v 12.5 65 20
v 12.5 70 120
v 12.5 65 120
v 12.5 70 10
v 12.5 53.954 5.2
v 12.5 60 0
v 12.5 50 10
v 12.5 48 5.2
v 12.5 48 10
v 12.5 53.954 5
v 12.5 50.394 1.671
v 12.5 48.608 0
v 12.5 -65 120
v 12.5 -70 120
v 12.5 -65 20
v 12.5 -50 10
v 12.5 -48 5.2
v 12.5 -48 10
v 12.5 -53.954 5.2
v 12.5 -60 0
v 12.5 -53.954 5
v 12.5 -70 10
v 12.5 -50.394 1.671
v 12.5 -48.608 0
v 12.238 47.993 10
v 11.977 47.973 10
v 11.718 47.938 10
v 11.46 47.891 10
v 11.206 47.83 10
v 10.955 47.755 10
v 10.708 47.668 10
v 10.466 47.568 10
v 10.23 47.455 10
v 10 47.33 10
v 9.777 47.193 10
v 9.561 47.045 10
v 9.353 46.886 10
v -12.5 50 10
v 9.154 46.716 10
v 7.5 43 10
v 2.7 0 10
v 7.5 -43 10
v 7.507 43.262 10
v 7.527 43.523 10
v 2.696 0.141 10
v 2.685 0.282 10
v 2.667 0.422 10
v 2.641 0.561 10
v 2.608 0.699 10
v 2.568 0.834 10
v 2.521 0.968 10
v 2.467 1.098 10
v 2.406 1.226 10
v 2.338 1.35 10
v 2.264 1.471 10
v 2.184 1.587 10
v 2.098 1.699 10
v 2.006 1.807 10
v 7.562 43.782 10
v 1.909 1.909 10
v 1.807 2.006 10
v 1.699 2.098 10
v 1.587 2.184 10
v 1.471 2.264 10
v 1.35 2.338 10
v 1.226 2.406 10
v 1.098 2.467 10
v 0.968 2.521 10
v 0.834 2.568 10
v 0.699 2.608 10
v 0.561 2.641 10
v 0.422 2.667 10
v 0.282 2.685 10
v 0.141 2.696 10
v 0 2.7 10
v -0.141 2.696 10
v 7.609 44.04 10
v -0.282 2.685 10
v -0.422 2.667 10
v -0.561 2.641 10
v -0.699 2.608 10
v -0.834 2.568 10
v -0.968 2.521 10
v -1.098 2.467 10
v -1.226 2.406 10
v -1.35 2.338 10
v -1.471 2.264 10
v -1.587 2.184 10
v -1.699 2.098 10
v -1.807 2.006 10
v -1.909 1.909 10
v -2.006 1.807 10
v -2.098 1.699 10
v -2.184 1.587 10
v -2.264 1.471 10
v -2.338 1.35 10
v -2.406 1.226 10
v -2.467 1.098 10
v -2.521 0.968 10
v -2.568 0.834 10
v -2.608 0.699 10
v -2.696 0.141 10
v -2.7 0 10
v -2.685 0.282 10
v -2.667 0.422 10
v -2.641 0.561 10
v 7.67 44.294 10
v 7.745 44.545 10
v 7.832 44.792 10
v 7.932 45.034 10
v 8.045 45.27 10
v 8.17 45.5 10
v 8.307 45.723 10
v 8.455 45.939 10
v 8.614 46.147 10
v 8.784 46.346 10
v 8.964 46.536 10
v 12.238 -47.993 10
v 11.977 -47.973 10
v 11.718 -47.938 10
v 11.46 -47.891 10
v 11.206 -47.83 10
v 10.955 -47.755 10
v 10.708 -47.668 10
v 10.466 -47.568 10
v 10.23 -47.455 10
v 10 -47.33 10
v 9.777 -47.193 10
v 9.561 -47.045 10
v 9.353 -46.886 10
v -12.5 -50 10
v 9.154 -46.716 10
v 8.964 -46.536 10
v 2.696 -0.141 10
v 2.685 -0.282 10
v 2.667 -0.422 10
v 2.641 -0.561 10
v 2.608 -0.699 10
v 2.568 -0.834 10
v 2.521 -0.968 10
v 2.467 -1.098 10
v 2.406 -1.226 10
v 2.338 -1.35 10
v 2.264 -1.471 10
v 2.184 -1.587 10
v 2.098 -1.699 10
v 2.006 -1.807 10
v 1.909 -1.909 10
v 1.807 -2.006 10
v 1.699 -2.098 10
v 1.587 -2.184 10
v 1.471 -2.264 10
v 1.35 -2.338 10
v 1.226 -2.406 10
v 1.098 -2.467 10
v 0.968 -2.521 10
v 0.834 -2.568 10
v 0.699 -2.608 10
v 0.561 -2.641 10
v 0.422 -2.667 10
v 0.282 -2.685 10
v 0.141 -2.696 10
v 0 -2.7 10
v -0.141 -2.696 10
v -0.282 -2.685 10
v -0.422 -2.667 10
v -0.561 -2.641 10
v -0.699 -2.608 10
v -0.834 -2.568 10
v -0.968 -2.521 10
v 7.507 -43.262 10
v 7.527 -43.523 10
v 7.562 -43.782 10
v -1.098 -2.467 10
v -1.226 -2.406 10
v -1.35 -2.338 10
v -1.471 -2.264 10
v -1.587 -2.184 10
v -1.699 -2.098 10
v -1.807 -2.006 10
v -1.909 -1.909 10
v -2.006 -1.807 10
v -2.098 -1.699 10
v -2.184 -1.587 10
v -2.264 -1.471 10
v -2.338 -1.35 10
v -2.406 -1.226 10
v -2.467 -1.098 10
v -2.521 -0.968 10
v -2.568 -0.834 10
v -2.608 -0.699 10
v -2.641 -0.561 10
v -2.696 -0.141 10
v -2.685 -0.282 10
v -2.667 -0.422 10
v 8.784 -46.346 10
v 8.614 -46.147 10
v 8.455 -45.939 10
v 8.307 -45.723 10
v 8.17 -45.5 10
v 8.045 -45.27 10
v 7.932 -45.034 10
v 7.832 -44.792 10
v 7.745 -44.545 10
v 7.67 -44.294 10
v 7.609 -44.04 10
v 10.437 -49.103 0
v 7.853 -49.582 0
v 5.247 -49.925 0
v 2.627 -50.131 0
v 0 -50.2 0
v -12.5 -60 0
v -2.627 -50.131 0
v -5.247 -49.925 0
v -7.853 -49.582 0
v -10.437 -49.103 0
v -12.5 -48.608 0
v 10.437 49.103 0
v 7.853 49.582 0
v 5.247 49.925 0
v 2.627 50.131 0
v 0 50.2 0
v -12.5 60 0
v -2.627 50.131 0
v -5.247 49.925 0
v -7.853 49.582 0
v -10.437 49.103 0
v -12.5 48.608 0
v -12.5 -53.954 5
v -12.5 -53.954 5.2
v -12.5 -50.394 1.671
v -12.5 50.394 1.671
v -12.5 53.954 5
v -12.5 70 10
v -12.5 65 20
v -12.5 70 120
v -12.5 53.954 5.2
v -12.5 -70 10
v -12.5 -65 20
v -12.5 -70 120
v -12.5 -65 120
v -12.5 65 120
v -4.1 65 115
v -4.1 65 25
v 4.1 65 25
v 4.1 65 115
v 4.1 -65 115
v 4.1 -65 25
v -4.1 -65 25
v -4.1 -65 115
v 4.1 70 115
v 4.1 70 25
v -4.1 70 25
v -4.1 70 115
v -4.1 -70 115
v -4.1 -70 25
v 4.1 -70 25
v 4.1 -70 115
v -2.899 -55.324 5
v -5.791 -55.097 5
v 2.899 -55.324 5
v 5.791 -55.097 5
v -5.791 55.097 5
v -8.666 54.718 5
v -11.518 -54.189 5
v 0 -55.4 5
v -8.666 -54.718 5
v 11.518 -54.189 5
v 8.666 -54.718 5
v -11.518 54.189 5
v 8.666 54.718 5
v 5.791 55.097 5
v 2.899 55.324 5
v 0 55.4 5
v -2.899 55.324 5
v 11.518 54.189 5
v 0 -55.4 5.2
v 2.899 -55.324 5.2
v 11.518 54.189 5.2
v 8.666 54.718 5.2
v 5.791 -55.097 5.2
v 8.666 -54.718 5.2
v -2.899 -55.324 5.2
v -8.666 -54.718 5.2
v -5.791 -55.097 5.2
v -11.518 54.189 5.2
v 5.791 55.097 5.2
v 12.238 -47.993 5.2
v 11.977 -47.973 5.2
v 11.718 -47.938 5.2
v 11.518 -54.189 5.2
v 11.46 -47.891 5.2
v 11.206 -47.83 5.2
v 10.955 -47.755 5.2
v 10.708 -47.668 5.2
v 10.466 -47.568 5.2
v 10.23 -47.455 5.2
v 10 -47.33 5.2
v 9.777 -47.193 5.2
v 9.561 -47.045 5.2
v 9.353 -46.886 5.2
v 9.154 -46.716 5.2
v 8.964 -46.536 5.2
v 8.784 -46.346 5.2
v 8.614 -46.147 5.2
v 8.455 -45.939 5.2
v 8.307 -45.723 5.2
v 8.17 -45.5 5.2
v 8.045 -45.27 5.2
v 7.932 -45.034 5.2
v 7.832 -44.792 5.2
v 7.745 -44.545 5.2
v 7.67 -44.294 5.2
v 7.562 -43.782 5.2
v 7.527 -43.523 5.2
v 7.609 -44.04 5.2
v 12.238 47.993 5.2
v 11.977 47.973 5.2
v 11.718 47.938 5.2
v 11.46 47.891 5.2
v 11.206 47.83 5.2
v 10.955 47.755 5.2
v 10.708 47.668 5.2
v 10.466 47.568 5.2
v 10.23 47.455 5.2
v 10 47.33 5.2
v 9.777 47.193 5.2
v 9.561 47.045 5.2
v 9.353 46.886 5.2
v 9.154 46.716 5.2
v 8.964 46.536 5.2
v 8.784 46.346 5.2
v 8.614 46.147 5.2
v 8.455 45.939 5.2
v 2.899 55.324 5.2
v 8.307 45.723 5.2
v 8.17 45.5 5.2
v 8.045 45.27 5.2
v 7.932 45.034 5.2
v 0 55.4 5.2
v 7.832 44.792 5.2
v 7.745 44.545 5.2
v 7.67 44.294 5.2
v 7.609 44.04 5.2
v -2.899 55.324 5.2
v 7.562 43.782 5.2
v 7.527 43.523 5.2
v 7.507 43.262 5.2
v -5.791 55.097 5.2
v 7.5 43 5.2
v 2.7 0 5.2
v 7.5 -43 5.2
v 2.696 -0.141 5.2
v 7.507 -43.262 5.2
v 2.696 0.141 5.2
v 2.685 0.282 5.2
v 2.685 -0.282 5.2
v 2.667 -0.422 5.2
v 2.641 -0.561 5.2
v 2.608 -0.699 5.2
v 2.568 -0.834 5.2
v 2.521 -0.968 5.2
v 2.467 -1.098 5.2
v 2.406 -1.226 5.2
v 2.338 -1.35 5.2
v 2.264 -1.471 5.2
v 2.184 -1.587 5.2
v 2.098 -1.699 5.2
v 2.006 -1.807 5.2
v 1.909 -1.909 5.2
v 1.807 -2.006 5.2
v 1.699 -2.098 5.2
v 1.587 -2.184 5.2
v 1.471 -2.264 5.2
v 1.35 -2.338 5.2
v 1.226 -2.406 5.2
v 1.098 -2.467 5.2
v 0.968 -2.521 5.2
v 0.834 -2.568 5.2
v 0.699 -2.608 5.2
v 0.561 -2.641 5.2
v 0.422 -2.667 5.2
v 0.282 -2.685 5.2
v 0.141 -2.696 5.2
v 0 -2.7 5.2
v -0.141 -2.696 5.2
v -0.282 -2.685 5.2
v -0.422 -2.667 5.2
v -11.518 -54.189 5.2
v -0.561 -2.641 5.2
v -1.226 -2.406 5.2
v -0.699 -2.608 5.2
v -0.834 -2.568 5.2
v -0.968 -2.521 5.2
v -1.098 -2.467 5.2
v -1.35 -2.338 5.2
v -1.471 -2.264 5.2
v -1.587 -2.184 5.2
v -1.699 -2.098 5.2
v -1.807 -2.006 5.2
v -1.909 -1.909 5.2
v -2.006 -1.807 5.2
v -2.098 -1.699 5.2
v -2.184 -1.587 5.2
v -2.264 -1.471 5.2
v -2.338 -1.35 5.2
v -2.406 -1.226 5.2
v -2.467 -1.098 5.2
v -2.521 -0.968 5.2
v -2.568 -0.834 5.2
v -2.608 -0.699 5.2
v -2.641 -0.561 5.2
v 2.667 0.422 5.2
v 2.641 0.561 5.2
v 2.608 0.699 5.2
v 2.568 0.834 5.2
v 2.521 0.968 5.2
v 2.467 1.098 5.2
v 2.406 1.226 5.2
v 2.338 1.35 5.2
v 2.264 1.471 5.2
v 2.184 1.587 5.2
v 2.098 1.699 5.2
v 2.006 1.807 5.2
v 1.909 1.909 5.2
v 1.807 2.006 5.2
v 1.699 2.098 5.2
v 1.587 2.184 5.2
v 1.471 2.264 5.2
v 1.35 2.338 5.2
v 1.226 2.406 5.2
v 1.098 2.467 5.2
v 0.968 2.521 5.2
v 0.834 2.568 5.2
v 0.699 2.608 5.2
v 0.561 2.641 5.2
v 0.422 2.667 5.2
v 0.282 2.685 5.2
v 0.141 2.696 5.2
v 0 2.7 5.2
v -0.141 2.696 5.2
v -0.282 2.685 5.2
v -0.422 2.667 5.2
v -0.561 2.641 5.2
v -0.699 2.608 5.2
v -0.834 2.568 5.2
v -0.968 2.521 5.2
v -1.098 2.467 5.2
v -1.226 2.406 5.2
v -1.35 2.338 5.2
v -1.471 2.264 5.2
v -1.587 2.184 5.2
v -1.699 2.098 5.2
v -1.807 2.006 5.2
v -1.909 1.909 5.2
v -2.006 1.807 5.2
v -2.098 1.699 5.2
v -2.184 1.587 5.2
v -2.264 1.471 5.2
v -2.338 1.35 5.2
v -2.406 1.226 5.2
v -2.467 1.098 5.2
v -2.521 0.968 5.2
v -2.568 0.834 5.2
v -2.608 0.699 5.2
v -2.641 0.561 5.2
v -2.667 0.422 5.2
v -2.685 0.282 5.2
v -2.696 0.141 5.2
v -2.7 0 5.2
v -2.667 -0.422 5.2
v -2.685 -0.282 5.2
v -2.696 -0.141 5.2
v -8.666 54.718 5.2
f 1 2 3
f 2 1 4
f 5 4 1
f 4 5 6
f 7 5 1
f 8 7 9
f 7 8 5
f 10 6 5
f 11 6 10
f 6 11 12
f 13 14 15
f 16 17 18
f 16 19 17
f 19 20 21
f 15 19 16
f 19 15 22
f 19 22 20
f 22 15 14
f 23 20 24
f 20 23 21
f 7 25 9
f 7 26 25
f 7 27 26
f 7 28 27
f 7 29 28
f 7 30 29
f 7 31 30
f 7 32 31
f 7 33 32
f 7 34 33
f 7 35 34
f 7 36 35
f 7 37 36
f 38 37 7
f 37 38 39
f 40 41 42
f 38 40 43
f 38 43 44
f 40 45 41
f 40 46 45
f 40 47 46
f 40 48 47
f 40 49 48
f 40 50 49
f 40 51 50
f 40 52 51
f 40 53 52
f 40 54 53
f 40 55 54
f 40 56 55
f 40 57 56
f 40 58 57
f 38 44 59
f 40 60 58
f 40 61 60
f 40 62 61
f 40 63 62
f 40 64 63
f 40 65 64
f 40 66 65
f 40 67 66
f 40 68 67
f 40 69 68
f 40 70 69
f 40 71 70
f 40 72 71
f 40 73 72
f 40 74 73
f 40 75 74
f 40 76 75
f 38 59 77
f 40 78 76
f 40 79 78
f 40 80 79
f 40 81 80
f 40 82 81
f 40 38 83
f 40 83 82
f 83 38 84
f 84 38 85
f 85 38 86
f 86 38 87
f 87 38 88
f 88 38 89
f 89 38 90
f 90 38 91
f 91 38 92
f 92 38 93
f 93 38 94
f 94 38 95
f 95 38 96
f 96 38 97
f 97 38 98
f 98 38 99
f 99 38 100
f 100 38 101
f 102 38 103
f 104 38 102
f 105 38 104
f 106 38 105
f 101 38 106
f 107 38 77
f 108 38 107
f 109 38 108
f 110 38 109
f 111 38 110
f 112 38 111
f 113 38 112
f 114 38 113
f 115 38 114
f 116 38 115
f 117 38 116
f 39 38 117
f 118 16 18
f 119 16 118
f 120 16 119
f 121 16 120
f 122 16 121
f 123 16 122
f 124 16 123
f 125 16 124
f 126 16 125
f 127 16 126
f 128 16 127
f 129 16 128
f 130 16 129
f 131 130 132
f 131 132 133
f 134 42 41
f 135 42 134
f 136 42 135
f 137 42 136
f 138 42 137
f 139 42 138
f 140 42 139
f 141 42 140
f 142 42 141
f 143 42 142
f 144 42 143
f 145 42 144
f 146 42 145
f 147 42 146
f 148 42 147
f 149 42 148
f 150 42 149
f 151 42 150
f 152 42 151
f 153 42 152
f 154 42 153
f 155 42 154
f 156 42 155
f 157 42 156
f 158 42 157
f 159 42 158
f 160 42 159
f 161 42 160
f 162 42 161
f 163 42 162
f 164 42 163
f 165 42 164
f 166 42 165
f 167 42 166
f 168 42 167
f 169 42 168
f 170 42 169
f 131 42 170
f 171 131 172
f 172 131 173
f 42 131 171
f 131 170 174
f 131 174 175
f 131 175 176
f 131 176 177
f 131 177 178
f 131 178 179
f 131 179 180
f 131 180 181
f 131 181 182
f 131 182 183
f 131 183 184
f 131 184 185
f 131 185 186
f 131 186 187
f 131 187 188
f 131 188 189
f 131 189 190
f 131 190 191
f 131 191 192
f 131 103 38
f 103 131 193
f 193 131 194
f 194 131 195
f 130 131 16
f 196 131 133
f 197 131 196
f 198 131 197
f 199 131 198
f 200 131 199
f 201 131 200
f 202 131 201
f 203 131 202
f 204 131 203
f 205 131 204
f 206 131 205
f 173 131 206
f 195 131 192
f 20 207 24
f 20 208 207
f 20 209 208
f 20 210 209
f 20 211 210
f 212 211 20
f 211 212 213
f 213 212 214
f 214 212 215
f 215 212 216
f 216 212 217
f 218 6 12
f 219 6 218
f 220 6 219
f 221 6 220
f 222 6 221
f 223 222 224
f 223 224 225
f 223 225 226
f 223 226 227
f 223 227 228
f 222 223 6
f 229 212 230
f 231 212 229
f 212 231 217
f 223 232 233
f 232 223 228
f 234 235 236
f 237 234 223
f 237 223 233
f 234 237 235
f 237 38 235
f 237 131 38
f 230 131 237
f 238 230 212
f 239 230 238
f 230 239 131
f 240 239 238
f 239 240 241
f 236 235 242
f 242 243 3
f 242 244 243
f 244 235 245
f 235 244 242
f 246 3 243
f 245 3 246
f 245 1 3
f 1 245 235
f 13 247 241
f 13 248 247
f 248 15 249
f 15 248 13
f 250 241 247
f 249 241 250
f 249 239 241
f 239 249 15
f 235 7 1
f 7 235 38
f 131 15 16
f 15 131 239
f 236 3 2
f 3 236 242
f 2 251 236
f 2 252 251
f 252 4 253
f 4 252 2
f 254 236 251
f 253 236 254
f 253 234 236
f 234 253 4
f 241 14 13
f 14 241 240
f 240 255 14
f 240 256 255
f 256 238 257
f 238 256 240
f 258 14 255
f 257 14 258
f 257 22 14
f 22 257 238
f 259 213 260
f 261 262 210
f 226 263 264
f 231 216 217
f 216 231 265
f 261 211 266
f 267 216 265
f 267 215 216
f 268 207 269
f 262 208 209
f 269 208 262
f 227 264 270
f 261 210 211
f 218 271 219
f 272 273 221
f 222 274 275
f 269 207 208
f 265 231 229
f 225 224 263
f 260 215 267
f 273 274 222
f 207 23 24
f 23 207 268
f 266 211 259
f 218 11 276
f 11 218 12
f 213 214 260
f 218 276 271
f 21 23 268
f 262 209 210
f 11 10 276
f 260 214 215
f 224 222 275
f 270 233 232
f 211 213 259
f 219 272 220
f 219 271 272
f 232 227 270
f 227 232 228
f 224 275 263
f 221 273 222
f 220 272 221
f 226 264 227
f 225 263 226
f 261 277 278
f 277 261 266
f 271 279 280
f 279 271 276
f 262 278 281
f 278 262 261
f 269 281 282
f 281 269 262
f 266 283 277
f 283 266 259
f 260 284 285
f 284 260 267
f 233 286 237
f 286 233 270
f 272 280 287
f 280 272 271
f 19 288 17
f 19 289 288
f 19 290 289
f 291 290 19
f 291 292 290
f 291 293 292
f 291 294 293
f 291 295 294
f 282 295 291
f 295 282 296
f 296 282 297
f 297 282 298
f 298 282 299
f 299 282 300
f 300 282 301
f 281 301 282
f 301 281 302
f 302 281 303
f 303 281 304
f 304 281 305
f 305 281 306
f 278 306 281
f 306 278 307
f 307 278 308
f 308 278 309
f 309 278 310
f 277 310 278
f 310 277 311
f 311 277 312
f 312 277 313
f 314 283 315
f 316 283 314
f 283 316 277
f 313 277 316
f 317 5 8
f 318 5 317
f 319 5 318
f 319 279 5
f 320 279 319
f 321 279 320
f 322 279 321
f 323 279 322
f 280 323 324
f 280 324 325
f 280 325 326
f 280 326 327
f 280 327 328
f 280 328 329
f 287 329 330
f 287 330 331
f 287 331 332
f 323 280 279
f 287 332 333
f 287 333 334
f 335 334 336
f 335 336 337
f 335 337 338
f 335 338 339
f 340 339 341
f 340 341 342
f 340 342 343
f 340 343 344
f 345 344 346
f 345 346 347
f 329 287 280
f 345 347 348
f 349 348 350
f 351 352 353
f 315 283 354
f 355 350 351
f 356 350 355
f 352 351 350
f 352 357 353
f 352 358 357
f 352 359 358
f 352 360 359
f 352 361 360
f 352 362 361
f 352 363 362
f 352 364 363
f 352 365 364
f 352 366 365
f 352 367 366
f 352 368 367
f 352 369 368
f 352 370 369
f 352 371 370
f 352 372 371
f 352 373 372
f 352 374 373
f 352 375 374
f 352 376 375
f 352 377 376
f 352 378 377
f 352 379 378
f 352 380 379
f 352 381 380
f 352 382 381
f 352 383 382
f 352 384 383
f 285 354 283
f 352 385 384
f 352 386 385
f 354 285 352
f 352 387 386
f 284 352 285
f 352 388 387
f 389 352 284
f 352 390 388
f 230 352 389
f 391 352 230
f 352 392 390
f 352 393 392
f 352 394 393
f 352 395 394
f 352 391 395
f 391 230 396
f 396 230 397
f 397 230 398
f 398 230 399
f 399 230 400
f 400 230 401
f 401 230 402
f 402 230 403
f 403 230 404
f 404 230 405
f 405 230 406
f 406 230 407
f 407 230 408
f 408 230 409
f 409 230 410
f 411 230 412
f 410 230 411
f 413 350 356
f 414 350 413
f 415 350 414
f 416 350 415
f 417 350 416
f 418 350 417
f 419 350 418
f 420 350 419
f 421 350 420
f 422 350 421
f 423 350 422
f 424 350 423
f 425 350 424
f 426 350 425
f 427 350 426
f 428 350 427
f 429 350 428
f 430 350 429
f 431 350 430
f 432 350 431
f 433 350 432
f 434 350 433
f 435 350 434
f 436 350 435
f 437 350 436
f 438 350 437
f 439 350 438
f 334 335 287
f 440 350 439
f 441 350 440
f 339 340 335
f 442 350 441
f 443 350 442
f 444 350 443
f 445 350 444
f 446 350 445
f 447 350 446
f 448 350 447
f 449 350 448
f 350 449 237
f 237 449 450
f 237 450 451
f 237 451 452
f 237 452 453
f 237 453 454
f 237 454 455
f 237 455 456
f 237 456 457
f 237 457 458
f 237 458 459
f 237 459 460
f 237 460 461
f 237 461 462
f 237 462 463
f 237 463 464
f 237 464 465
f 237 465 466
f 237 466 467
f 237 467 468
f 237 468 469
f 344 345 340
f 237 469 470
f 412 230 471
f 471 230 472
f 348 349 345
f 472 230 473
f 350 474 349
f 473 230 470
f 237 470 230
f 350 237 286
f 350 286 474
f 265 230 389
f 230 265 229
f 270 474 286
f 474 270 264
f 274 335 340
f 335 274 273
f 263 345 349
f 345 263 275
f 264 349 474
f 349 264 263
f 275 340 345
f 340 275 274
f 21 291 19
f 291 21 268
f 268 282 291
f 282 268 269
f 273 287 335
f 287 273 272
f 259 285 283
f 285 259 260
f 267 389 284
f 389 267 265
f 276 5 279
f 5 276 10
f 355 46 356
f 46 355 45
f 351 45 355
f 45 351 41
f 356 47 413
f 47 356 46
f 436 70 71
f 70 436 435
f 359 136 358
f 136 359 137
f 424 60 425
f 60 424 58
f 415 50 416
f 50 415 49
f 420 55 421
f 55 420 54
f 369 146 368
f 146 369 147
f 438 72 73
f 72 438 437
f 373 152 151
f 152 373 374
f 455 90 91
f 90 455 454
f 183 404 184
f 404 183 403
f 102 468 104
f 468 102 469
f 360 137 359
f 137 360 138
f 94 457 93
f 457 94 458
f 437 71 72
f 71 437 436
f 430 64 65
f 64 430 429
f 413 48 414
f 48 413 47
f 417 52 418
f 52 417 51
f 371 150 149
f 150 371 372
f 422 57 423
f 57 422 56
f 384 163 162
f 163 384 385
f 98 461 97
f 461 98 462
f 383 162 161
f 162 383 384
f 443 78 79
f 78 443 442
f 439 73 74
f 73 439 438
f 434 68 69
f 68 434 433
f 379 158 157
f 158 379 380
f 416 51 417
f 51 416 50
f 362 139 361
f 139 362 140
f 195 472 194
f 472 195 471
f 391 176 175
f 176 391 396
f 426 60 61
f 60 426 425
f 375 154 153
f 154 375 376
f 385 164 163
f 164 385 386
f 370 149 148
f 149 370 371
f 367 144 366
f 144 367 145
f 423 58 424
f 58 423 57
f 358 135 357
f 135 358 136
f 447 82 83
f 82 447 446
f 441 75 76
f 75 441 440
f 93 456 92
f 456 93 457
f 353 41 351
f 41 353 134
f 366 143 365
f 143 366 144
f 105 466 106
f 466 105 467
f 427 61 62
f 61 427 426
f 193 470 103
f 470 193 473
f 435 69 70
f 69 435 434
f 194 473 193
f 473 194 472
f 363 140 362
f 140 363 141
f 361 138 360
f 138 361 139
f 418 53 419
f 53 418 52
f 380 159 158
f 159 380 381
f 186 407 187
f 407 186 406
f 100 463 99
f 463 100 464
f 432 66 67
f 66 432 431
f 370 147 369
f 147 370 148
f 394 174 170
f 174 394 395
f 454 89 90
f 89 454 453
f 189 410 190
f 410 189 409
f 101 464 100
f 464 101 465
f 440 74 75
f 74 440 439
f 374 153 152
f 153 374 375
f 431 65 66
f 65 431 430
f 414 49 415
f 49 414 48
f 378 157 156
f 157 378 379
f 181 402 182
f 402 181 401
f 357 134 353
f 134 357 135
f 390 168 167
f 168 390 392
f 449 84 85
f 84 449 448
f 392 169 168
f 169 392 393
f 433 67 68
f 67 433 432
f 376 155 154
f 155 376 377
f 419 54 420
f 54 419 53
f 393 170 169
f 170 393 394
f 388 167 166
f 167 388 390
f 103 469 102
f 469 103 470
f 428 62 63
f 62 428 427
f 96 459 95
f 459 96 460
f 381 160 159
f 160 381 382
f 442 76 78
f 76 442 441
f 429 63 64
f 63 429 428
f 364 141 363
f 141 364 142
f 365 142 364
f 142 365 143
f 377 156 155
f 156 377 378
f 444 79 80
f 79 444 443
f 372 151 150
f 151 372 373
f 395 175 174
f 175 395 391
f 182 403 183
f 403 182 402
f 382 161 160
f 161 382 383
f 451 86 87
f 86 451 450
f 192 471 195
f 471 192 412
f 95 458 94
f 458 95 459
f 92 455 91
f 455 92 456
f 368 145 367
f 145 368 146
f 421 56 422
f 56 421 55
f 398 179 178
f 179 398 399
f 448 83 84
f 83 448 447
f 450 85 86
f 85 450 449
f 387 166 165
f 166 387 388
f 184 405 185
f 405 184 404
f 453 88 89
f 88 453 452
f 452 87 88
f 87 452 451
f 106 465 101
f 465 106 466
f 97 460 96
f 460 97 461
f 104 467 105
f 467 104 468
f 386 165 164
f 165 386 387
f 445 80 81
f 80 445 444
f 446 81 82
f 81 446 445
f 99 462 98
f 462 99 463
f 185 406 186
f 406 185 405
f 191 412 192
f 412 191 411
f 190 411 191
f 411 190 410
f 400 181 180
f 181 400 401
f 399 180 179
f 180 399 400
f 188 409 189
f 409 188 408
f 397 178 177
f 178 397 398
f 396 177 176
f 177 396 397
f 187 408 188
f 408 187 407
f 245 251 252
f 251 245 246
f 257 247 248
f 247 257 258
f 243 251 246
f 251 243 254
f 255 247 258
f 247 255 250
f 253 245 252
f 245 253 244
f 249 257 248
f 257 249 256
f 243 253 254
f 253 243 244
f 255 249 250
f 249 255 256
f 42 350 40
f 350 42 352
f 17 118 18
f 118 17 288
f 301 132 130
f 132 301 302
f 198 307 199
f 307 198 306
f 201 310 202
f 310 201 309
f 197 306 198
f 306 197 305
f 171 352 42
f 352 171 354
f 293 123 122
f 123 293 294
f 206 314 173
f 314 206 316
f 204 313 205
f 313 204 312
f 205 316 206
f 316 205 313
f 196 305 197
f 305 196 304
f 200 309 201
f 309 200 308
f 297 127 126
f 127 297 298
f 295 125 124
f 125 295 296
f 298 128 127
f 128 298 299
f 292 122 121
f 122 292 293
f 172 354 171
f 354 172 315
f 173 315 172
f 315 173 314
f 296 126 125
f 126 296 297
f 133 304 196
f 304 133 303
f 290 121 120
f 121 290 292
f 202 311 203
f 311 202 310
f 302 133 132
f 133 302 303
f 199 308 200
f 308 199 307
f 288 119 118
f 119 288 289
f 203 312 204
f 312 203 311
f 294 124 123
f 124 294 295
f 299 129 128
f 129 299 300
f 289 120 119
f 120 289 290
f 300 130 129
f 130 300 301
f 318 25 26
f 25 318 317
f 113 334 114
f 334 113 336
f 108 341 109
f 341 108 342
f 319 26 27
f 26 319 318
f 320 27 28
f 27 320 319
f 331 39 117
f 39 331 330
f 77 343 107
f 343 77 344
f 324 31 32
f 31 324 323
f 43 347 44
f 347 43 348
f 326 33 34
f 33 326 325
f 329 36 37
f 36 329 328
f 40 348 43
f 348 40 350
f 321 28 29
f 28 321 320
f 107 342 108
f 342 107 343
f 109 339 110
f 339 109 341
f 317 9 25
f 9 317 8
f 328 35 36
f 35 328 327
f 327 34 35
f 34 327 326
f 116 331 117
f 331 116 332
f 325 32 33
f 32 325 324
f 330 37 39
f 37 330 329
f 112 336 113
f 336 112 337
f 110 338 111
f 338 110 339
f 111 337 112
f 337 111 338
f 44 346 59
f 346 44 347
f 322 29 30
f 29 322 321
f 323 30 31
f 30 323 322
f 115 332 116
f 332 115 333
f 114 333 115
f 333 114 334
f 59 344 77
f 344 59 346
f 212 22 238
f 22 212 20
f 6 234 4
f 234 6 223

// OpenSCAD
// some variables
$fn = 120; // we are using 60 fragments for cylinders and similar objects

vTolerance_length = 1;
vTolerance_width = 0.2;
vTolerance_height = 0.2;
vTolerance_diameter = 0.2;

// we will use the same "module" size for out dovetails
vDovetail_length = 5;
vDovetail_height = 5;

// base plate
vFrontStandartBasePlate_d1 = 110; // maybe subtract tolerance here?
vFrontStandartBasePlate_d2 = vFrontStandartBasePlate_d1-(2*vDovetail_length);
vFrontStandartBasePlate_length = 40; // we are intersecting our cylinder with a cube!
vFrontStandartBasePlate_width = vFrontStandartBasePlate_d1;
vFrontStandartBasePlate_h1 = vDovetail_height;
vFrontStandartBasePlate_h2 = vDovetail_height;
vFrontStandartBasePlate_height = vFrontStandartBasePlate_h1+vFrontStandartBasePlate_h1;
vFrontStandartBasePlate_offsetX = 0;
vFrontStandartBasePlate_offsetY = 0;
vFrontStandartBasePlate_offsetZ = 0;

vCentralScrewHole_d = 5+2*vTolerance_width;
vCentralScrewHole_h = vFrontStandartBasePlate_height;
vCentralScrewHole_offsetX = 0;
vCentralScrewHole_offsetY = 0;
vCentralScrewHole_offsetZ = 0;

vFrontStandartTiltPlate_length = 25;
vFrontStandartTiltPlate_width = 130;
vFrontStandartTiltPlate_height = 10;

vFrontStandartTiltPlate_offsetX = -vFrontStandartTiltPlate_length/2;
vFrontStandartTiltPlate_offsetY = -vFrontStandartTiltPlate_width/2;
vFrontStandartTiltPlate_offsetZ = 0;

vTiltDoveTail_d1 = vFrontStandartBasePlate_d2+(2*vTolerance_width);
vTiltDoveTail_d2 = vTiltDoveTail_d1+(2*vDovetail_length)+(2*vTolerance_width);
vTiltDovetail_h = vDovetail_height;

vUprightHolder_length = vFrontStandartTiltPlate_length;
vUprightHolder_width = 15;
vUprightHolder_height = 10;
vUprightHolderLeft_offsetX = vFrontStandartTiltPlate_offsetX;
vUprightHolderLeft_offsetY = -vFrontStandartTiltPlate_offsetY;
vUprightHolderRight_offsetX = -vFrontStandartTiltPlate_offsetX;
vUprightHolderRight_offsetY = vFrontStandartTiltPlate_offsetY;
vUprightHolder_offsetZ = vFrontStandartTiltPlate_height;

vUpright_length = vFrontStandartTiltPlate_length;
vUpright_width = 5;
vUpright_height = 120;
vUprightSlotCutout_length = 8+vTolerance_width;
vUprightSlotCutout_width = vFrontStandartTiltPlate_width+(2*vUpright_width);
vUprightSlotCutout_height = 90;
vUprightLeft_offsetX = vFrontStandartTiltPlate_offsetX;
vUprightRight_offsetX = vFrontStandartTiltPlate_offsetX;
vUprightLeft_offsetY = vFrontStandartTiltPlate_width/2;
vUprightRight_offsetY = -(vFrontStandartTiltPlate_width/2)-vUpright_width;
vUprightSlotCutout_offsetX = -vUprightSlotCutout_length/2;
vUprightSlotCutout_offsetY = -vUprightSlotCutout_width/2;
vUprightSlotCutout_offsetZ = 25;

vPullingLeverCutout_length = 5;
vPullingLeverCutout_width = 86;
vPullingLeverCutout_height = vFrontStandartBasePlate_height;
vPullingLeverCutout_offsetX = -vFrontStandartTiltPlate_offsetX-vPullingLeverCutout_length;
vPullingLeverCutout_offsetY = -vPullingLeverCutout_width/2;
vPullingLeverCutout_offsetZ = 0;

vEdgeCutoff_l = vFrontStandartTiltPlate_length;
vEdgeCutoff_w = 10;
vEdgeCutoff_h = 10; 
vEdgeCutoff_offsetX = vEdgeCutoff_l/2;
vEdgeCutoff_offsetY = -(vFrontStandartTiltPlate_width+10)/2;
vEdgeCutoff_offsetZ = 0;

/*
vUprightScrewHole_diameter = 2;
vUprightScrewHole_height = vFrontStandartTiltPlate_width;
vUprightScrewHole_offsetX = 5;
vUprightScrewHole_offsetY = -vFrontStandartTiltPlate_offsetY;
vUprightScrewHole_offsetZ = vFrontStandartTiltPlate_height+vUprightScrewHole_diameter;
*/




module roof(l, w, h){
    polyhedron(
        points=[
            [0,0,0],
            [l,0,0],
            [l,w,0],
            [0,w,0],
            [l/2,0,h],
            [l/2,w,h]
            ],
        faces=[
            [0,1,2,3],
            [0,4,1],
            [1,4,5,2],
            [2,5,3],
            [3,5,4,0]
            ]
            );
    };

//roof(20, 10, 15);

module wedge(l, w, h) {
    polyhedron(
            points=[
                [0,0,0],
                [l,0,0],
                [0,w,0],
                [0,0,h],
                [l,0,h],
                [0,w,h]
            ],
            faces=[
                [0,1,2],
                [0,3,4,1],
                [1,4,5,2],
                [2,5,3,0],
                [3,5,4]
            ]
    );
   };    
//wedge(20, 30, 40);

module tube(d1, d2, h) {
    difference() {
        cylinder(d=d1, h=h);
        cylinder(d=d2, h=h);
        }
    };
 
 
    





// temporary objects

module hex(kw, h) {
	render() translate([0, 0, h/2]) intersection_for(a = [0, 120, 240]) {
		rotate([0, 0, a]) cube([kw, 3 * kw, h], true);
	}
}
//hex(10, 5);




difference(){
    union(){
        translate([vFrontStandartTiltPlate_offsetX, vFrontStandartTiltPlate_offsetY, vFrontStandartTiltPlate_offsetZ])
            cube([vFrontStandartTiltPlate_length, vFrontStandartTiltPlate_width, vFrontStandartTiltPlate_height]);
        // left upright holder
        translate([vUprightHolderLeft_offsetX, vUprightHolderLeft_offsetY, vUprightHolder_offsetZ])
            rotate([0, 270, 180])
                wedge(vUprightHolder_height, vUprightHolder_width, vUprightHolder_length);

        // right upright holder
        translate([vUprightHolderRight_offsetX, vUprightHolderRight_offsetY, vUprightHolder_offsetZ])
            rotate([0, 270, 0])
                wedge(vUprightHolder_height, vUprightHolder_width, vUprightHolder_length);
        // left upright 
        translate([vUprightLeft_offsetX, vUprightLeft_offsetY, 0])
            cube([vUpright_length, vUpright_width, vUpright_height]);
        
        // right upright
        translate([vUprightRight_offsetX, vUprightRight_offsetY, 0])
            cube([vUpright_length, vUpright_width, vUpright_height]);
        };
        
    // cutout for the dovetail itself
    cylinder(d1=vTiltDoveTail_d1, d2=vTiltDoveTail_d2, h=vTiltDovetail_h);
    // a little bit tolerance
    translate([0, 0, vTiltDovetail_h])
        cylinder(d=vTiltDoveTail_d2, h=vTolerance_height);

    // central screw hole
    cylinder(d=vCentralScrewHole_d, h=vFrontStandartTiltPlate_height);
    
    // cutout for upright slot
    translate([vUprightSlotCutout_offsetX, vUprightSlotCutout_offsetY, vUprightSlotCutout_offsetZ])
        cube([vUprightSlotCutout_length, vUprightSlotCutout_width, vUprightSlotCutout_height]);
       
    // cutout for pulling levers
    translate([vPullingLeverCutout_offsetX, vPullingLeverCutout_offsetY, vPullingLeverCutout_offsetZ])
        cube([vPullingLeverCutout_length, vPullingLeverCutout_width, vPullingLeverCutout_height]); 
    // rounding the cutout edges
    translate([-vFrontStandartTiltPlate_offsetX, vPullingLeverCutout_offsetY, vPullingLeverCutout_offsetZ])
        cylinder(r=vPullingLeverCutout_length, h=vPullingLeverCutout_height);   
    translate([-vFrontStandartTiltPlate_offsetX, -vPullingLeverCutout_offsetY, vPullingLeverCutout_offsetZ])
        cylinder(r=vPullingLeverCutout_length, h=vPullingLeverCutout_height); 
    
    // cut the lower edges
    translate([vEdgeCutoff_offsetX, vEdgeCutoff_offsetY, vEdgeCutoff_offsetZ])
        rotate([0, 270, 0])
            wedge(vEdgeCutoff_w, vEdgeCutoff_h, vEdgeCutoff_l);
    translate([vEdgeCutoff_offsetX, -vEdgeCutoff_offsetY, vEdgeCutoff_offsetZ])
        rotate([0, 270, 0])
            wedge(vEdgeCutoff_w, -vEdgeCutoff_h, vEdgeCutoff_l);
    /*
    // screw holes for the uprights
    translate([-vUprightScrewHole_offsetX, vUprightScrewHole_offsetY, vUprightScrewHole_offsetZ])
        rotate([90, 0, 0])
            cylinder(d=vUprightScrewHole_diameter, h=vUprightScrewHole_height);

    translate([vUprightScrewHole_offsetX, vUprightScrewHole_offsetY, vUprightScrewHole_offsetZ])
        rotate([90, 0, 0])
            cylinder(d=vUprightScrewHole_diameter, h=vUprightScrewHole_height);    
    */

};
